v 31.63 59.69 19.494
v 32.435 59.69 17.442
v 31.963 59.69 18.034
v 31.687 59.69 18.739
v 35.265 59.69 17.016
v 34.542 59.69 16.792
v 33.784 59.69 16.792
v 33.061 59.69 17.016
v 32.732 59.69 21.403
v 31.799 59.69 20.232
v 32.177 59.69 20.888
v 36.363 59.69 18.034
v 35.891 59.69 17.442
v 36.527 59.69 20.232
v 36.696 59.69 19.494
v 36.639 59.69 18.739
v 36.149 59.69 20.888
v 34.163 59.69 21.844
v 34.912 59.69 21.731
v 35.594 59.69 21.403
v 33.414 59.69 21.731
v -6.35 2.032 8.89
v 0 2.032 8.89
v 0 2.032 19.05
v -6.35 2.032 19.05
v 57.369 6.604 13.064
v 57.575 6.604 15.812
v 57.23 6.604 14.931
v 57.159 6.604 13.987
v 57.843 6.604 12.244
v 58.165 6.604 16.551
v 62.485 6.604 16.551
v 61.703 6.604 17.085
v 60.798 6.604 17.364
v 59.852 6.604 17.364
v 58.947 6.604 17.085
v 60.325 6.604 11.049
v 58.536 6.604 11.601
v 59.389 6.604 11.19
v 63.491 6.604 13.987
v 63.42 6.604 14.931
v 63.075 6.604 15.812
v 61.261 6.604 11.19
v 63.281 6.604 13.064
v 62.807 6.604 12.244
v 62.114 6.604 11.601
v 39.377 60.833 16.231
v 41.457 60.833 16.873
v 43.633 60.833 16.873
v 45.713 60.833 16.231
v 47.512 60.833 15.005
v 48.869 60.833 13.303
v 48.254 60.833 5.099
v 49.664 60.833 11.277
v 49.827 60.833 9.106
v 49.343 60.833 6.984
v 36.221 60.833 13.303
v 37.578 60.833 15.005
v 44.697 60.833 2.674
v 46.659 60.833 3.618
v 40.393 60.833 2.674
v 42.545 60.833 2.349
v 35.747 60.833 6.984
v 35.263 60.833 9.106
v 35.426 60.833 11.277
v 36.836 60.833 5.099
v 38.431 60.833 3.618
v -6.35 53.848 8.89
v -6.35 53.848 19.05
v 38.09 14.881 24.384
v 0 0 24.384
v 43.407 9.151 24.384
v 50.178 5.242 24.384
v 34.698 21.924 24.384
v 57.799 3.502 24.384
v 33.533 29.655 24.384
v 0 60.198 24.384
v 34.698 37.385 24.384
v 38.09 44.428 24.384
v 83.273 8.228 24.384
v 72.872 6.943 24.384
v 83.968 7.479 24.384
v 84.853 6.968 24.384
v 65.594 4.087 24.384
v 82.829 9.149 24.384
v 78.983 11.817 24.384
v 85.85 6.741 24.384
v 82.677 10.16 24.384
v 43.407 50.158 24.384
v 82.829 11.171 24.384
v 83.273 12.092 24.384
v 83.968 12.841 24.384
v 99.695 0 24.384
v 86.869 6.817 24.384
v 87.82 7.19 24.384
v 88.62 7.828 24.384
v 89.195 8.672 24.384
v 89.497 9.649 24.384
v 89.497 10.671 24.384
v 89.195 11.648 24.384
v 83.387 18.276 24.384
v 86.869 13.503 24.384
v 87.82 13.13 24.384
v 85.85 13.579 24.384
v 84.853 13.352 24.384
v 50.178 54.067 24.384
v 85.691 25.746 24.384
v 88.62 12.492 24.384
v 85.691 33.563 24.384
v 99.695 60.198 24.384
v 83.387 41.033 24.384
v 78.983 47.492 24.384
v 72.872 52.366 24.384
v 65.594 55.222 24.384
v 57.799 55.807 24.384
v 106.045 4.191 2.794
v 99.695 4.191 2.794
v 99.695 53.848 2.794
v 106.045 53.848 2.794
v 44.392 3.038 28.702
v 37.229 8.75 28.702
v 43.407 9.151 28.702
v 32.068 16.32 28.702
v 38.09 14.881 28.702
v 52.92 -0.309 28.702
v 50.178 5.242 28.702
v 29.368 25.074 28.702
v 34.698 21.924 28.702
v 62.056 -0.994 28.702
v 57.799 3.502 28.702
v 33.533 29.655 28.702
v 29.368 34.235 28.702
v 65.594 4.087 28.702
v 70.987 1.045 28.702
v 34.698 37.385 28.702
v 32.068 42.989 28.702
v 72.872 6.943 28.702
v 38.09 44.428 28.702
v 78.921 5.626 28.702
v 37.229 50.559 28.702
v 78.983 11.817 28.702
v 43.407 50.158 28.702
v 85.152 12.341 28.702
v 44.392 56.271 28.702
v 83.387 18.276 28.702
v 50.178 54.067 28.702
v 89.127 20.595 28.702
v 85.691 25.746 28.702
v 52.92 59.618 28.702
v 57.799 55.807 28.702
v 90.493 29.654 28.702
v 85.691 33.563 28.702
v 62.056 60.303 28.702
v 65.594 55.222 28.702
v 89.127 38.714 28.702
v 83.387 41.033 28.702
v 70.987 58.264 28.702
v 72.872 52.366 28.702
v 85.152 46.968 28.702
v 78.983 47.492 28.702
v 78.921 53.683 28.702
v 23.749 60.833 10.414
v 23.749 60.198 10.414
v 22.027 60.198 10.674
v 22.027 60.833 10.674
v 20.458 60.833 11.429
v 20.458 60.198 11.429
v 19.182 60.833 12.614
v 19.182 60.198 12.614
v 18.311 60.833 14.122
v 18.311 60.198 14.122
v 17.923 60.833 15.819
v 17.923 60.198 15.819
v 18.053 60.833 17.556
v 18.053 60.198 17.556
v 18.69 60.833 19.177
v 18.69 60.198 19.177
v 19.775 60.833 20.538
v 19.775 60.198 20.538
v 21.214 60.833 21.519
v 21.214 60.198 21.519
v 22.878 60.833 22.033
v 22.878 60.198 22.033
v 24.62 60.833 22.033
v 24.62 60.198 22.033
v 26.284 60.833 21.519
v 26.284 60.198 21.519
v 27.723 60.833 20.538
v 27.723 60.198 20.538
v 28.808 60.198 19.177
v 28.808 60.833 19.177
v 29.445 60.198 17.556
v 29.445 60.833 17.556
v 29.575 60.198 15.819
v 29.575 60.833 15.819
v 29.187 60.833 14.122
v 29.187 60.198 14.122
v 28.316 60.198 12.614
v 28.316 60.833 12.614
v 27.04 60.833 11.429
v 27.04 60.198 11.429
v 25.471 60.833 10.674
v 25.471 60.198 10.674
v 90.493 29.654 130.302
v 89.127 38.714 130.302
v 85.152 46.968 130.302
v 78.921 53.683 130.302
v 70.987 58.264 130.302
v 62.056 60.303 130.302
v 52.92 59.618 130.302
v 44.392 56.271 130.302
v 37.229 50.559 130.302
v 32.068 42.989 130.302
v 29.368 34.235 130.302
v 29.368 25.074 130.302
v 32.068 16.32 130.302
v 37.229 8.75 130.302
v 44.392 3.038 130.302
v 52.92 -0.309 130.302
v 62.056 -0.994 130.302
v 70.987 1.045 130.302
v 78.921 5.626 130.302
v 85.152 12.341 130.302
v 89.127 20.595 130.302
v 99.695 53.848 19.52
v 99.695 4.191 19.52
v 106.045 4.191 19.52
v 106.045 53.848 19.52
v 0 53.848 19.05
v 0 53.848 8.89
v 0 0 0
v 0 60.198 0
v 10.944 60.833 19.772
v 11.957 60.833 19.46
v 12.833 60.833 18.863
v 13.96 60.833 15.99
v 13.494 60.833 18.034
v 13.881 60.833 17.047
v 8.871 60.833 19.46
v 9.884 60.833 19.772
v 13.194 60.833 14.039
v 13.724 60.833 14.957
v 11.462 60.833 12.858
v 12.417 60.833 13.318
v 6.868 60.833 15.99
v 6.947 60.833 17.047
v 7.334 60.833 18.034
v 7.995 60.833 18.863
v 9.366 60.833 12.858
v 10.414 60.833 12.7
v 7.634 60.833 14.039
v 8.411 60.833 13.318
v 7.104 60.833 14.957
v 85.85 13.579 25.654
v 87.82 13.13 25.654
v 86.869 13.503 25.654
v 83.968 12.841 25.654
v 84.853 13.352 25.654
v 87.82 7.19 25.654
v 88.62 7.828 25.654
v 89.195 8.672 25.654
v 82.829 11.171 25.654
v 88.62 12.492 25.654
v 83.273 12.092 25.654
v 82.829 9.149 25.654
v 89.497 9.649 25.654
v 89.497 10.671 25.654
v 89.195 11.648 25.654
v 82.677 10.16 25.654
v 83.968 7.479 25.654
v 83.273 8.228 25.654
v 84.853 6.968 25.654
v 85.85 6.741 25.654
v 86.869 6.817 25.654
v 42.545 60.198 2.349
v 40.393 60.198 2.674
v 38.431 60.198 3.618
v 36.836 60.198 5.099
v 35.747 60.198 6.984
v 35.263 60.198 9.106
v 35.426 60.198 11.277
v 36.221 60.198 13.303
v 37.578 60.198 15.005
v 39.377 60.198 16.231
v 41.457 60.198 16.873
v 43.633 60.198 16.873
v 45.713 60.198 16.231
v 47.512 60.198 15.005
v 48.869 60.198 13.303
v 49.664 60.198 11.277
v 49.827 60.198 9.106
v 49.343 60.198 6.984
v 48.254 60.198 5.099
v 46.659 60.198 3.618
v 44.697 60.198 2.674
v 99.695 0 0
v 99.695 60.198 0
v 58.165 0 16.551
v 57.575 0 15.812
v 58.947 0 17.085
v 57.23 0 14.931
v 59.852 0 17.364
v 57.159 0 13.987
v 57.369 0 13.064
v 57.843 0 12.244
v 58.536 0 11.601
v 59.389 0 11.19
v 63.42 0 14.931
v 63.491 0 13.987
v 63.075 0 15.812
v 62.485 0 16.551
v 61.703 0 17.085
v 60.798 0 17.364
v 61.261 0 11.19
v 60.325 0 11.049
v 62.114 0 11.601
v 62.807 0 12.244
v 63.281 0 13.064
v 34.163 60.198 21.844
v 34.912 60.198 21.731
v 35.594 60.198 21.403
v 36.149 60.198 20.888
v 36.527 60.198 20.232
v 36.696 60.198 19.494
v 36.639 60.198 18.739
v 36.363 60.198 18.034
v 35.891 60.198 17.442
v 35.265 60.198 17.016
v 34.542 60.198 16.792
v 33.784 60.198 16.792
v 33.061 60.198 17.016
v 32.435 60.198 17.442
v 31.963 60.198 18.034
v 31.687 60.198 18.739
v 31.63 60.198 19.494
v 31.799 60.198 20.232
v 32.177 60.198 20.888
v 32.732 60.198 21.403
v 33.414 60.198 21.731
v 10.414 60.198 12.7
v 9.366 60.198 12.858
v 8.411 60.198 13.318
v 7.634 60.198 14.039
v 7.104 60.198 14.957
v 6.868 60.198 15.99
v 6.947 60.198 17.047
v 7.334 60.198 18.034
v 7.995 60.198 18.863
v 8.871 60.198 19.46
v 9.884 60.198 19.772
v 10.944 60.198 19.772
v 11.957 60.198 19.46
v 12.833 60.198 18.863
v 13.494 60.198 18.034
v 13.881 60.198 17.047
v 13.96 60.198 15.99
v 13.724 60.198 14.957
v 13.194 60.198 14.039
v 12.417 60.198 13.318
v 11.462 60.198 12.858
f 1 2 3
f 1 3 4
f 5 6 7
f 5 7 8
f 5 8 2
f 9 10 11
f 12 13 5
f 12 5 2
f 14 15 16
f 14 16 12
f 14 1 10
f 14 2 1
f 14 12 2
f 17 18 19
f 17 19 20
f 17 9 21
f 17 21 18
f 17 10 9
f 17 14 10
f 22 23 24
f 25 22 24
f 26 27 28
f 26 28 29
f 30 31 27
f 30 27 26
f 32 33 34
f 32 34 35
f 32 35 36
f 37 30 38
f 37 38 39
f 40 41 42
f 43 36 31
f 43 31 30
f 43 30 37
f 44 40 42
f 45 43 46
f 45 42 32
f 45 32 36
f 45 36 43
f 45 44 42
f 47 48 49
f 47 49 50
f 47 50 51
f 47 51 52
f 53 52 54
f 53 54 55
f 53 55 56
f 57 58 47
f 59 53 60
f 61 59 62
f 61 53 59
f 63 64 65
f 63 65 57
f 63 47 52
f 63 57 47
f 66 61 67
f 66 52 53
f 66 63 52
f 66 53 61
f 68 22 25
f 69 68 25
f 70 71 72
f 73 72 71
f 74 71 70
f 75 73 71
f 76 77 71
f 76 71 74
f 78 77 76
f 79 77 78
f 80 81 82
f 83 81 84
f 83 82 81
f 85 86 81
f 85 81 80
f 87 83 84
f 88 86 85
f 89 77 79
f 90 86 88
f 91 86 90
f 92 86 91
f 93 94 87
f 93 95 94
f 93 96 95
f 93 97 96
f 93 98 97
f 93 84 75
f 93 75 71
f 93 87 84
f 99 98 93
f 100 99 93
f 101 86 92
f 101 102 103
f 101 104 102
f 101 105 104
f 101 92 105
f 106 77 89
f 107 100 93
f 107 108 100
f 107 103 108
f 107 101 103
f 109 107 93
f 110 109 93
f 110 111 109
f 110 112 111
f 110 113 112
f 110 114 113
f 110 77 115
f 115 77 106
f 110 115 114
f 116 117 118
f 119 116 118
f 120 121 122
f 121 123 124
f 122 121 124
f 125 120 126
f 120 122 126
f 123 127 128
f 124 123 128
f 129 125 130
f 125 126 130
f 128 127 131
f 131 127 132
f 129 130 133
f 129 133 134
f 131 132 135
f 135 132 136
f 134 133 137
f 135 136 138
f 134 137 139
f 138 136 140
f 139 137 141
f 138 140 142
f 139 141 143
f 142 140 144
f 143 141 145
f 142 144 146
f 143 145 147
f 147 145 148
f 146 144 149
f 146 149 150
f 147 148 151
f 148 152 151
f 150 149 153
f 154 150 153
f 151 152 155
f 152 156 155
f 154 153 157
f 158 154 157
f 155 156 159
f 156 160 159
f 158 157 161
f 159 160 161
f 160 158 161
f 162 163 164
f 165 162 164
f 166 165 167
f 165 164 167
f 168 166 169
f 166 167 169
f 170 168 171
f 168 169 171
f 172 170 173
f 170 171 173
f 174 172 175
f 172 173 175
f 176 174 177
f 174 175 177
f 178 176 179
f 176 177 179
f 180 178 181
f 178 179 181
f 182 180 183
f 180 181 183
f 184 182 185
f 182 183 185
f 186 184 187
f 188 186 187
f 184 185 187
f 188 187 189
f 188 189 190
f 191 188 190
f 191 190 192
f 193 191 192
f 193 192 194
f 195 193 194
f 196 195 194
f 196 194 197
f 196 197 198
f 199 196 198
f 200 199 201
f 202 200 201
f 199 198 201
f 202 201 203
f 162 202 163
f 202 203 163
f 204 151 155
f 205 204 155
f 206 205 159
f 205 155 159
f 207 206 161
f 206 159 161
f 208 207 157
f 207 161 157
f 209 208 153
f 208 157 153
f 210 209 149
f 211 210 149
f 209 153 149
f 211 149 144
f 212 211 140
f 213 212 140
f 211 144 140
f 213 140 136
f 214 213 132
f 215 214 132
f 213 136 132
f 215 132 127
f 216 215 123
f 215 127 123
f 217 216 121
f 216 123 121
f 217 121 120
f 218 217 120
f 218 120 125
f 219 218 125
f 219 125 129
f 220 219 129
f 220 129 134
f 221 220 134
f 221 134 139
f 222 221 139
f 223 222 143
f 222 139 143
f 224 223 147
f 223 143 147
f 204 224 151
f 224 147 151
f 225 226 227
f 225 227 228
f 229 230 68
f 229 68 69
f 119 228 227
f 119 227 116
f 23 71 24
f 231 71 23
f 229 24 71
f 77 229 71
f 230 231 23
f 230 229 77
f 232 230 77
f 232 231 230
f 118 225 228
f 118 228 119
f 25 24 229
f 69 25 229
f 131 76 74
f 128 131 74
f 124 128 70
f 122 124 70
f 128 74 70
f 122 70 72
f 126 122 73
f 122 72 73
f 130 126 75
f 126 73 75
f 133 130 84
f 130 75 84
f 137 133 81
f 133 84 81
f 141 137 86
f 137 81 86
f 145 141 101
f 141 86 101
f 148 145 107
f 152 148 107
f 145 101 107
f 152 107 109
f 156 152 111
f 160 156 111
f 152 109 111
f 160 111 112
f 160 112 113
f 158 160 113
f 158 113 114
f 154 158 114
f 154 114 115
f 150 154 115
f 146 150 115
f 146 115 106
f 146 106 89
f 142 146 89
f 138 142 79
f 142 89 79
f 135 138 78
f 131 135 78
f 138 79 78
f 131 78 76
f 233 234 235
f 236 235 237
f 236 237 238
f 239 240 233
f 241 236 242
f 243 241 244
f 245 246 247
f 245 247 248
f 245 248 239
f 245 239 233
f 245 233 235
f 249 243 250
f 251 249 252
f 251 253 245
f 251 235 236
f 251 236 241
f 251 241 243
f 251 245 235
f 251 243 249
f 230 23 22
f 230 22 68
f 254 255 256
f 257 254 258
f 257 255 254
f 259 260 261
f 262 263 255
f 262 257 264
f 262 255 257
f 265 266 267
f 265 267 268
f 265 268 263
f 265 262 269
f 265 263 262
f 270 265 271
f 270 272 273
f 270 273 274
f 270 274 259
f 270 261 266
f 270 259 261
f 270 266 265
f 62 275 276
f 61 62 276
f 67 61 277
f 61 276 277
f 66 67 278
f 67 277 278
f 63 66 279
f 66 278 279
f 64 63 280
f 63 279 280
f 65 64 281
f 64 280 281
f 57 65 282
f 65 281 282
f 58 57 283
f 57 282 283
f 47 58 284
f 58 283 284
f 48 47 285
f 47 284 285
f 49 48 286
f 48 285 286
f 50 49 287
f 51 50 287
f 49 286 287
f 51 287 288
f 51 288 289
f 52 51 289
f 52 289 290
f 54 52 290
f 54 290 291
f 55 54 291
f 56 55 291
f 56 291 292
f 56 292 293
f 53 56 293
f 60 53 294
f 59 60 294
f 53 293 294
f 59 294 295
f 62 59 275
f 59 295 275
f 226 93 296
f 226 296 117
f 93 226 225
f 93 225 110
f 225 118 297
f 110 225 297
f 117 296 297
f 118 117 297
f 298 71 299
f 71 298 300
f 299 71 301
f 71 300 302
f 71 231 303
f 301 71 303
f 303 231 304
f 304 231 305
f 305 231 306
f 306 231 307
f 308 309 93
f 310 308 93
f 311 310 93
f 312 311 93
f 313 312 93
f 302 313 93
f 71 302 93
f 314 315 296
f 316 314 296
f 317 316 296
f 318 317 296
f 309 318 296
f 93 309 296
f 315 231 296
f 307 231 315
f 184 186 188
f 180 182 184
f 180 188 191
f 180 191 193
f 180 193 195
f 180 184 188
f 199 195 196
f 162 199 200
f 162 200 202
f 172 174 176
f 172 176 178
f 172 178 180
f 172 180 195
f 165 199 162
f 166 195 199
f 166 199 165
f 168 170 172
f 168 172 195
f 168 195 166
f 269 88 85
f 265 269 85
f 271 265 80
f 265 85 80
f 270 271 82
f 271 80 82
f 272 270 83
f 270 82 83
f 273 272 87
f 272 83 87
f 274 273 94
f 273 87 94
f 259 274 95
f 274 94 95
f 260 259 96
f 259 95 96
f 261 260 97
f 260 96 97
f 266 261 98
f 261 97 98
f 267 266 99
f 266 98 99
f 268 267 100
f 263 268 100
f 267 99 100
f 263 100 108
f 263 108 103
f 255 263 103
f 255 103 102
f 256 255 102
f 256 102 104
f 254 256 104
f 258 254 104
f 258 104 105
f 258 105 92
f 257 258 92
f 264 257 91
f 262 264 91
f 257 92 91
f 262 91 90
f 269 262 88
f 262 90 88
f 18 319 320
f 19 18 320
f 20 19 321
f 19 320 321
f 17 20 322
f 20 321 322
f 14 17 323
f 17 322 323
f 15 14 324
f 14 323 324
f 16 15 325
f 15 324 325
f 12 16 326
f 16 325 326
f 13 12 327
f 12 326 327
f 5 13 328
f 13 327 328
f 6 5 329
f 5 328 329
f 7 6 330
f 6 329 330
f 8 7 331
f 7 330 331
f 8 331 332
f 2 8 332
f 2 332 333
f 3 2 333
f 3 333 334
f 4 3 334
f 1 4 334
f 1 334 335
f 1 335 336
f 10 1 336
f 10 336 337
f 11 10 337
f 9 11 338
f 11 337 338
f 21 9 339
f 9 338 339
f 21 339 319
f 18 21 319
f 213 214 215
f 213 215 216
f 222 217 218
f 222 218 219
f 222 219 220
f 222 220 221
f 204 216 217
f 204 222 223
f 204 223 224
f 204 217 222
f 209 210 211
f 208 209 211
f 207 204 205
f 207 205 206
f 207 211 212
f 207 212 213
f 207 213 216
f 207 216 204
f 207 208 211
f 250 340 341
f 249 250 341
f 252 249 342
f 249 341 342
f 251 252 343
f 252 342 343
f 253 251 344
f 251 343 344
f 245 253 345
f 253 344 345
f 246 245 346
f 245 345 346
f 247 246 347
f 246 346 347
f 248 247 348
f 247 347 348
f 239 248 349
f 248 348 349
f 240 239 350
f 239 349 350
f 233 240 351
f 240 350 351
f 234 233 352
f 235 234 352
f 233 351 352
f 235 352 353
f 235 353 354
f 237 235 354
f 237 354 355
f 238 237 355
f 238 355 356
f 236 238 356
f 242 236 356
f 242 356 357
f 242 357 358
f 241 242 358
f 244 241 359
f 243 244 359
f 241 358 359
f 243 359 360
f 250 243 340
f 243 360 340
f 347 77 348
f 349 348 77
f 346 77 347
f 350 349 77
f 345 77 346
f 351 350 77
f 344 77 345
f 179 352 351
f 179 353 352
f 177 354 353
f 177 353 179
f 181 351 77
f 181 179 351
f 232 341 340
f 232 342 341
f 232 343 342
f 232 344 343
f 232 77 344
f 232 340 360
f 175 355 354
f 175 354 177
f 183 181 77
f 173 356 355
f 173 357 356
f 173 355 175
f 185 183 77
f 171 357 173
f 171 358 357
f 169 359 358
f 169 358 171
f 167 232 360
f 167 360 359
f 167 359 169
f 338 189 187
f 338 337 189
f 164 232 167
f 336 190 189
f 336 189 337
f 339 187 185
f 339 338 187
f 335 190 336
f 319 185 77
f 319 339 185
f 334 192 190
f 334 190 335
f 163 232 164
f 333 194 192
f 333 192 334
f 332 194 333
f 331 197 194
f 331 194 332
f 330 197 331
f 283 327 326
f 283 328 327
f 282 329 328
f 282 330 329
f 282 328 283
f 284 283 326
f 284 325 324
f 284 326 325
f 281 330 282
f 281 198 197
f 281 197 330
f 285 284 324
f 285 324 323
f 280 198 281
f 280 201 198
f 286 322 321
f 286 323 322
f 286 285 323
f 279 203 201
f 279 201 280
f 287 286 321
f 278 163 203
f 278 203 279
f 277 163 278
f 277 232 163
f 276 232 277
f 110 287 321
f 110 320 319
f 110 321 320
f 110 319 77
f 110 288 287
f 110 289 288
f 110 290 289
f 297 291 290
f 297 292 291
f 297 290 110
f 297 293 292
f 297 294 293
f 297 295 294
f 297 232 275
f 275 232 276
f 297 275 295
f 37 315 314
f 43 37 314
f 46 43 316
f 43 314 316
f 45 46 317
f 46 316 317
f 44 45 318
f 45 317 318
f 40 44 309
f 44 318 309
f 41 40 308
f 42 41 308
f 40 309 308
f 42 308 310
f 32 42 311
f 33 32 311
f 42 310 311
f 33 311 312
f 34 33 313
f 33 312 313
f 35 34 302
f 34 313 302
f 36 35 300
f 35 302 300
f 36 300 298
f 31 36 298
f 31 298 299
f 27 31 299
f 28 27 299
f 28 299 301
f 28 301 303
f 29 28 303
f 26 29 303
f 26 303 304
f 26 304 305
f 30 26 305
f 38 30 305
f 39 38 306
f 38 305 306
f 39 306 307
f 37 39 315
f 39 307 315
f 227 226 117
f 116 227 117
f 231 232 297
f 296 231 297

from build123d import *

# Parameters (mm, degrees)
SKETCH1_W           = 99.695
SKETCH1_H           = 60.198
BOSS_EXTRUDE1_DEPTH = 24.384
SKETCH2_R           = 26.2255
BOSS_EXTRUDE2_DEPTH = 4.318
SKETCH3_R           = 3.429
BOSS_EXTRUDE3_DEPTH = 1.27
SKETCH4_R           = 3.556
SKETCH4_R_2         = 5.842
SKETCH4_R_3         = 7.3025
BOSS_EXTRUDE4_DEPTH = 0.635
SKETCH7_R           = 2.54
CUT_EXTRUDE1_DEPTH  = 0.508
SKETCH8_R           = 3.175
CUT_EXTRUDE2_DEPTH  = 6.604
SKETCH9_W           = 10.16
SKETCH9_H           = 51.816
BOSS_EXTRUDE5_DEPTH = 6.35
SKETCH10_W          = 16.726375359
SKETCH10_H          = 49.657
BOSS_EXTRUDE6_DEPTH = 6.35
SKETCH11_R          = 30.734
BOSS_EXTRUDE7_DEPTH = 101.6


with BuildPart() as part:
    # Sketch1 → Boss-Extrude1 (new body)
    with BuildSketch(Plane.XY):
        with Locations((49.8475, 30.099)):
            Rectangle(SKETCH1_W, SKETCH1_H)
    extrude(amount=BOSS_EXTRUDE1_DEPTH)

    # Sketch2 → Boss-Extrude2 (add)
    with BuildSketch(Plane.XY.offset(24.384)):
        with Locations(Location((59.758770255, 29.6545, 0), (0, 0, 180))):
            Circle(SKETCH2_R)
    extrude(amount=BOSS_EXTRUDE2_DEPTH)

    # Sketch3 → Boss-Extrude3 (add)
    with BuildSketch(Plane.XY.offset(24.384)):
        with Locations(Location((86.106, 10.16, 0), (0, 0, 180))):
            Circle(SKETCH3_R)
    extrude(amount=BOSS_EXTRUDE3_DEPTH)

    # Sketch4 → Boss-Extrude4 (add)
    with BuildSketch(Plane(origin=(0, 60.198, 0), x_dir=(1, 0, 0), z_dir=(0, 1, 0))):
        with Locations(Location((10.414, -16.256, 0), (0, 0, 90))):
            Circle(SKETCH4_R)
        with Locations(Location((23.749, -16.256, 0), (0, 0, 90))):
            Circle(SKETCH4_R_2)
        with Locations(Location((42.545, -9.652, 0), (0, 0, 90))):
            Circle(SKETCH4_R_3)
    extrude(amount=BOSS_EXTRUDE4_DEPTH)

    # Sketch7 → Cut-Extrude1 (cut)
    with BuildSketch(Plane(origin=(0, 60.198, 0), x_dir=(1, 0, 0), z_dir=(0, 1, 0))):
        with Locations(Location((34.163, -19.304, 0), (0, 0, 270))):
            Circle(SKETCH7_R)
    extrude(amount=-CUT_EXTRUDE1_DEPTH, mode=Mode.SUBTRACT)

    # Sketch8 → Cut-Extrude2 (cut)
    with BuildSketch(Plane.XZ):
        with Locations(Location((60.325, 14.224, 0), (0, 0, 270))):
            Circle(SKETCH8_R)
    extrude(amount=-CUT_EXTRUDE2_DEPTH, mode=Mode.SUBTRACT)

    # Sketch9 → Boss-Extrude5 (add)
    with BuildSketch(Plane.ZY):
        with Locations((13.97, 27.94)):
            Rectangle(SKETCH9_W, SKETCH9_H)
    extrude(amount=BOSS_EXTRUDE5_DEPTH)

    # Sketch10 → Boss-Extrude6 (add)
    with BuildSketch(Plane(origin=(99.695, 0, 0), x_dir=(0, 0, -1), z_dir=(1, 0, 0))):
        with Locations((-11.15718768, 29.0195)):
            Rectangle(SKETCH10_W, SKETCH10_H)
    extrude(amount=BOSS_EXTRUDE6_DEPTH)

    # Sketch11 → Boss-Extrude7 (add)
    with BuildSketch(Plane.XY.offset(28.702)):
        with Locations((59.758770255, 29.6545)):
            Circle(SKETCH11_R)
    extrude(amount=BOSS_EXTRUDE7_DEPTH)


solid = part.part
